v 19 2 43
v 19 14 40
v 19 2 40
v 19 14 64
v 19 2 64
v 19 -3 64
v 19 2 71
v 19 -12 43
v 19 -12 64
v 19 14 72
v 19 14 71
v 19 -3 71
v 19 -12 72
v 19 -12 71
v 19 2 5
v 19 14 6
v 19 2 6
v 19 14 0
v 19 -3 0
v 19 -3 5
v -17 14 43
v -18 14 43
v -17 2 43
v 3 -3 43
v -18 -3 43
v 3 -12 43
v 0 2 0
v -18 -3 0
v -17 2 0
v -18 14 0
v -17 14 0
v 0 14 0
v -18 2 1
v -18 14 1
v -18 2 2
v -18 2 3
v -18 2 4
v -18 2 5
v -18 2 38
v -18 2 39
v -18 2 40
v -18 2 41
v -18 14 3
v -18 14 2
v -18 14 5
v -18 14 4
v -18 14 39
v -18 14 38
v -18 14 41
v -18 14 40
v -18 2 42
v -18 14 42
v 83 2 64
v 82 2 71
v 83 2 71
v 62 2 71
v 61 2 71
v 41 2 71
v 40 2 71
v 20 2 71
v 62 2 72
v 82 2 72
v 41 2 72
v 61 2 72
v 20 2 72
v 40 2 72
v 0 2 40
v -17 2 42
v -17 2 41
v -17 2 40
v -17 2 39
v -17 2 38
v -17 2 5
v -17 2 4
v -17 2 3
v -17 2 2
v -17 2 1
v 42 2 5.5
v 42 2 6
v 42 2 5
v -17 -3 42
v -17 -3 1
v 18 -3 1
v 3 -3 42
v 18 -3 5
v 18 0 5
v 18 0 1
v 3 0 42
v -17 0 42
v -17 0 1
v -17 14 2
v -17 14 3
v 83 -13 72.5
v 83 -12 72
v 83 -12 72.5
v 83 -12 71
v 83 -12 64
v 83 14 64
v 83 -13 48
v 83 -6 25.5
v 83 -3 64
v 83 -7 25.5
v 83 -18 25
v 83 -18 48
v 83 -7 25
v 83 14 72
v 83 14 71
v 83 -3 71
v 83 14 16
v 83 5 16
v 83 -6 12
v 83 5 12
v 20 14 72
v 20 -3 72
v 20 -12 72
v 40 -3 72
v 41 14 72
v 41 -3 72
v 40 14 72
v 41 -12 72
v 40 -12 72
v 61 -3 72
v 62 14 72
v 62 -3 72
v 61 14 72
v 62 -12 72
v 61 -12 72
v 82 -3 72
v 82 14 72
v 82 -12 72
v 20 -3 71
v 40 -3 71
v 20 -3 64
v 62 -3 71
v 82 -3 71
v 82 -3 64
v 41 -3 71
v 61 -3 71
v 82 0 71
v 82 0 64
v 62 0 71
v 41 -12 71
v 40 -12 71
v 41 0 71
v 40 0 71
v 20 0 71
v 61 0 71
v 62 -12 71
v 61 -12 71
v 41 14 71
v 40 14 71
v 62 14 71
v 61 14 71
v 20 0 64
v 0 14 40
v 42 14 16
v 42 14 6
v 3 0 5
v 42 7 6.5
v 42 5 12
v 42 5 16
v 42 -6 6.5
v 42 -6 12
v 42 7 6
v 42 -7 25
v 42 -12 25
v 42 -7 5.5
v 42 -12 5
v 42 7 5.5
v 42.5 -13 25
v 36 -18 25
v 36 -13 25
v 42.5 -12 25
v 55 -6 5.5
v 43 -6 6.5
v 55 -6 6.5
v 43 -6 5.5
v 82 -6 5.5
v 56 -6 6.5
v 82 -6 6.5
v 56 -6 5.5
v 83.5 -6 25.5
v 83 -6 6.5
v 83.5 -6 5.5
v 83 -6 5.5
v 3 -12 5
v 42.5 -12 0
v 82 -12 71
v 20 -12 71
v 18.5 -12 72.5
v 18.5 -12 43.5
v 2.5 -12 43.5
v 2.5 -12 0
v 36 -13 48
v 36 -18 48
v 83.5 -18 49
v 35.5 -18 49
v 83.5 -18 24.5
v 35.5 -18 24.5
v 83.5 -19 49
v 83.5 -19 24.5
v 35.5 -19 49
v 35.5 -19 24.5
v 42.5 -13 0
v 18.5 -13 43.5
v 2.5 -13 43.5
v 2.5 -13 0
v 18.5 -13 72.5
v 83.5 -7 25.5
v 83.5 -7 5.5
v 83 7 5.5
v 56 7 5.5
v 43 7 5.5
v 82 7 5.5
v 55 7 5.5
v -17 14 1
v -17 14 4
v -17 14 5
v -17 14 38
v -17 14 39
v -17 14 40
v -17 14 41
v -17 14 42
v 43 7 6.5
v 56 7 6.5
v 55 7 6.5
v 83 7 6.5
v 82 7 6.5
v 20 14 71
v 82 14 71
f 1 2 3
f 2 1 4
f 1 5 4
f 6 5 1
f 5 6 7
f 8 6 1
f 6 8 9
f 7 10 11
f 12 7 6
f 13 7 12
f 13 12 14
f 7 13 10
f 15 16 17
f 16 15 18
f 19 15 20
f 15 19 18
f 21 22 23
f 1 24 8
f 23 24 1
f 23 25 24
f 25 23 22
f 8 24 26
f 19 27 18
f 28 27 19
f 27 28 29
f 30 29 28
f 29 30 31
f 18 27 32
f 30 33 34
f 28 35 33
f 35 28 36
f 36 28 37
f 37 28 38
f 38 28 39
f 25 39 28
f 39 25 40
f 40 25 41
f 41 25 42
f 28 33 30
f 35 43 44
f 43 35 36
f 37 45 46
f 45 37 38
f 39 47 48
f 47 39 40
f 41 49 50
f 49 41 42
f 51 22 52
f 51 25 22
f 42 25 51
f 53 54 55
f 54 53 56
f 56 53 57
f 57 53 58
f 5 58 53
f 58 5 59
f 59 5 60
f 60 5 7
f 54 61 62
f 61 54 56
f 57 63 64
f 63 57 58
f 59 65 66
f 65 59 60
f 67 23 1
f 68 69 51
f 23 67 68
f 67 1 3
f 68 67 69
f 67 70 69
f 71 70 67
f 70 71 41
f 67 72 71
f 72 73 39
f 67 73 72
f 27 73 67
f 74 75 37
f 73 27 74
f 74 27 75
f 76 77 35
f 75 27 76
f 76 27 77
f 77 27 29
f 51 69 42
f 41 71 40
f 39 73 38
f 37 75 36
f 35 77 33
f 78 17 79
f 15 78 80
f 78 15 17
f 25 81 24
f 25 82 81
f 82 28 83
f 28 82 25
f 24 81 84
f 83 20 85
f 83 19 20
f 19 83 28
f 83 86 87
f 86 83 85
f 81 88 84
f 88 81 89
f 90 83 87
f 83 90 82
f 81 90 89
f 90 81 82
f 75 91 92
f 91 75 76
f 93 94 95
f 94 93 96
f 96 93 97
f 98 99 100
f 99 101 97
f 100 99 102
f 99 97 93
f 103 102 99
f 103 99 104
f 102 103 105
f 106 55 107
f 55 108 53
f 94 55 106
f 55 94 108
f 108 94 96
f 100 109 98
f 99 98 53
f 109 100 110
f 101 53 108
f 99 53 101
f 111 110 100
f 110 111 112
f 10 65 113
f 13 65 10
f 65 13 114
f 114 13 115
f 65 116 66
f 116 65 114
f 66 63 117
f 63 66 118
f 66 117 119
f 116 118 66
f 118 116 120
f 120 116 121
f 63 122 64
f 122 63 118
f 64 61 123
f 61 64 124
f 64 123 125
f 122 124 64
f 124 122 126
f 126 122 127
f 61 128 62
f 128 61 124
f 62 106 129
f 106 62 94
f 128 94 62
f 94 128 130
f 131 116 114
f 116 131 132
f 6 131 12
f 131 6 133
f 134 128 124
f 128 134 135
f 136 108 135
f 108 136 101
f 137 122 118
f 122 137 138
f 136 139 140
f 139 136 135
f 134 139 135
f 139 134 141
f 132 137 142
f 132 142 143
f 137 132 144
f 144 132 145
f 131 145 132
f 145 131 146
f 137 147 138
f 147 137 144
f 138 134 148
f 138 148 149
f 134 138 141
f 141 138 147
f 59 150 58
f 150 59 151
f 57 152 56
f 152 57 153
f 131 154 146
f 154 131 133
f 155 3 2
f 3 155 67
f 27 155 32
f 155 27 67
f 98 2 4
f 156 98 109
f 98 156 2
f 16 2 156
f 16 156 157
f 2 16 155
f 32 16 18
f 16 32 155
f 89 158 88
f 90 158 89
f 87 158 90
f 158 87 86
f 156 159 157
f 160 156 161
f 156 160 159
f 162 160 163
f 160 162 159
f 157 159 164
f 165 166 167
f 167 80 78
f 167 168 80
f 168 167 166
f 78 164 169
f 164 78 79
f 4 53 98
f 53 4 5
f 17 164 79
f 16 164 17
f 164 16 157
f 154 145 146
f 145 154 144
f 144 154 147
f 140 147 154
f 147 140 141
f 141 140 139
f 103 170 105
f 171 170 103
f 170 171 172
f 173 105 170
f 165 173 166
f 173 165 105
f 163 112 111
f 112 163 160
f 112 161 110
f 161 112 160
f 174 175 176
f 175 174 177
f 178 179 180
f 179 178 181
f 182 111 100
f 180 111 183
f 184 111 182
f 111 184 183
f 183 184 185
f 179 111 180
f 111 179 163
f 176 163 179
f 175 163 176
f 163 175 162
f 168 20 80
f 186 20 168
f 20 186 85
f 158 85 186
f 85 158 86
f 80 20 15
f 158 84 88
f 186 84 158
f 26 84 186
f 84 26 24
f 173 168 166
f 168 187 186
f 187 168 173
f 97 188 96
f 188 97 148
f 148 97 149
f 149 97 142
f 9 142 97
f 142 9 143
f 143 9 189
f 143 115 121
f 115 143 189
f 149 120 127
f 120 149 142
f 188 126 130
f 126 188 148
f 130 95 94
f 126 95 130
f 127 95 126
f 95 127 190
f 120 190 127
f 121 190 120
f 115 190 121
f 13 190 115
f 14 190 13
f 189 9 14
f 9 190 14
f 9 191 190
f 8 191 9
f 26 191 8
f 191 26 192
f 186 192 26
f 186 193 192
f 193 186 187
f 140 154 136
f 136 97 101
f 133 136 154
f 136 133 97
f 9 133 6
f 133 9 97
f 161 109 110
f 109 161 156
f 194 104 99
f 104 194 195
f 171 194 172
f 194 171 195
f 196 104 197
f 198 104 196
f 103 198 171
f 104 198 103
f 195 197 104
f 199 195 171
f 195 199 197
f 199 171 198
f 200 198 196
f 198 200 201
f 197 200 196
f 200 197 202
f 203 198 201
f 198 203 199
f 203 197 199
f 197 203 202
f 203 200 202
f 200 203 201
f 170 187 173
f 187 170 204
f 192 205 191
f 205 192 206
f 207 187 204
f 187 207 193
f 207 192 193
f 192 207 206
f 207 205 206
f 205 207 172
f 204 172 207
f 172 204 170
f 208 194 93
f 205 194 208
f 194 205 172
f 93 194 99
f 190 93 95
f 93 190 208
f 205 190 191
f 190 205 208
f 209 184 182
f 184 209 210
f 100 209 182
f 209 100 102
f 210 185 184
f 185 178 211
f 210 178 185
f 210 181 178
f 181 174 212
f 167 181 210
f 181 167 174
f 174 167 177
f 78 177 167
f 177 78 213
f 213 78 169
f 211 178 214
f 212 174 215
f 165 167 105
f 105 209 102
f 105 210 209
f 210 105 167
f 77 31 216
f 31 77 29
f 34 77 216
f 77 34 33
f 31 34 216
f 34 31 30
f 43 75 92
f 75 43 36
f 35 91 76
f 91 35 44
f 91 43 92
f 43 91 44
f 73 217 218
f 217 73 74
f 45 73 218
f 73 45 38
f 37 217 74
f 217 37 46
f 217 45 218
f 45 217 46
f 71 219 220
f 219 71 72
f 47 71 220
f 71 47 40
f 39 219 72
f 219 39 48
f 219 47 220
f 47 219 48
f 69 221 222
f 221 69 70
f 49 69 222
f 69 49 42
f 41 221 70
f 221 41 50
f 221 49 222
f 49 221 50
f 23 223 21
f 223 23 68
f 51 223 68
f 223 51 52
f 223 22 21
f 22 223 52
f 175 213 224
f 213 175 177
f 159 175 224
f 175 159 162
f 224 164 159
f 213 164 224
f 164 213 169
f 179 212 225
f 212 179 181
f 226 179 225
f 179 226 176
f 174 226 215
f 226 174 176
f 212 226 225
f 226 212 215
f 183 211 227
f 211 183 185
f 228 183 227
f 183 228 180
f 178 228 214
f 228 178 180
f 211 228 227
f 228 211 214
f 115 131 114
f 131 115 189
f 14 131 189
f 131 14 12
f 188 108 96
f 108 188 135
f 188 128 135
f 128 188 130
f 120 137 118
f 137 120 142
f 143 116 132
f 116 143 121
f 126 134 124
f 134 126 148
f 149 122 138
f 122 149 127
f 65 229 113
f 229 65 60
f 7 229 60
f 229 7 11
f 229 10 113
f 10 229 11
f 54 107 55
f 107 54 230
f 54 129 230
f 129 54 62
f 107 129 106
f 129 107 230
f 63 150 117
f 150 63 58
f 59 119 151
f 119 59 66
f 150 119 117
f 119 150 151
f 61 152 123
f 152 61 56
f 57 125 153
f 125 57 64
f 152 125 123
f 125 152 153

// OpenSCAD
color("lightblue") cube([19,14,40]);//Garage
color("Lightblue")translate([19,0,6]) cube([23,14,58 ]);//Den
color("Tan") translate([42,-6,12]) cube([41,11,13]);//Front Door Space
color("Tan") translate([3,-12,5]) cube([39,14,38]);//Second Floor Bedrooms
color("Lightblue")translate([19,-12,25]) cube([64,14,39]);//Second Floor Bedrooms Part 2
color("Lightblue") translate([42,0,16]) cube([41,14,48]);//Bottom Floor Part 2
color("Lightblue") translate([36,-18,25]) cube([47,6,23]);//The Tower
color("Lightblue") translate([-18,0,0]) cube([37,2,43]);//Upstairs Balcony 1
color("White") translate([19,0,33]) cube([64,2,39]);//Upstairs Balcony 2

//Celings
color("White") translate([35.5,-19,24.5]) cube([48,1,24.5]);//The Tower Celing
color("White") translate([2.5,-13,0]) cube([40,1,43.5]);//The Second Floor Roof 1
color("White") translate([18.5,-13,26]) cube([64.5,1,46.5]);//The Second Floor Roof 2
color("White") translate([42,-7,5.5]) cube([41.5,1,20]);//Front Door Roof

//Pillars
color("White") translate([-18,0,0]) cube([1,14,1]);//Drive Port Pillar 1
color("White") translate([-18,0,2]) cube([1,14,1]);//Drive Port Pillar 2
color("White") translate([-18,0,4]) cube([1,14,1]);//Drive Port Pillar 3
color("White") translate([-18,0,38]) cube([1,14,1]);//Drive Port Pillar 11
color("White") translate([-18,0,40]) cube([1,14,1]);//Drive Port Pillar 12
color("White") translate([-18,0,42]) cube([1,14,1]);//Drive Port Pillar 13
color("White") translate([42,-7,5.5]) cube([1,14,1]);//Front Door Pillar 1
color("White") translate([55,-7,5.5]) cube([1,14,1]);//Front Door Pillar 2
color("White") translate([82,-7,5.5]) cube([1,14,1]);//Front Door Pillar 3
color("white") translate([19,-13,71]) cube([1,14,1]);//Balcony Pillar 1
color("white") translate([82,-13,71]) cube([1,14,1]);//Balcony Pillar 2
color("white") translate([40,-13,71]) cube([1,14,1]);//Balcony Pillar 3
color("white") translate([61,-13,71]) cube([1,14,1]);//Balcony Pillar 4
color("white") translate([19,0,71]) cube([1,14,1]);//Downstairs Pillar 1
color("white") translate([82,0,71]) cube([1,14,1]);//Downstairs Pillar 2
color("white") translate([40,0,71]) cube([1,14,1]);//Downstairs Pillar 3
color("white") translate([61,-0,71]) cube([1,14,1]);//Downstairs Pillar 4

Balcony1();
Balcony2();






module Balcony1(){
	difference(){
		color("LightBlue") translate([-18,-3,0]) cube([37,5,43]);//Upstairs Balcony 1
		color("White") translate([-17,-3,1]) cube([35,5,41]);//Upstairs Balcony 1
	}
}
module Balcony2(){
	difference(){
		color("White") translate([19,-3,33]) cube([64,5,39]);//Upstairs Balcony 2
		color("LightBlue") translate([20,-3,34]) cube([62,5,37]);//Upstairs Balcony 2
	}
}
